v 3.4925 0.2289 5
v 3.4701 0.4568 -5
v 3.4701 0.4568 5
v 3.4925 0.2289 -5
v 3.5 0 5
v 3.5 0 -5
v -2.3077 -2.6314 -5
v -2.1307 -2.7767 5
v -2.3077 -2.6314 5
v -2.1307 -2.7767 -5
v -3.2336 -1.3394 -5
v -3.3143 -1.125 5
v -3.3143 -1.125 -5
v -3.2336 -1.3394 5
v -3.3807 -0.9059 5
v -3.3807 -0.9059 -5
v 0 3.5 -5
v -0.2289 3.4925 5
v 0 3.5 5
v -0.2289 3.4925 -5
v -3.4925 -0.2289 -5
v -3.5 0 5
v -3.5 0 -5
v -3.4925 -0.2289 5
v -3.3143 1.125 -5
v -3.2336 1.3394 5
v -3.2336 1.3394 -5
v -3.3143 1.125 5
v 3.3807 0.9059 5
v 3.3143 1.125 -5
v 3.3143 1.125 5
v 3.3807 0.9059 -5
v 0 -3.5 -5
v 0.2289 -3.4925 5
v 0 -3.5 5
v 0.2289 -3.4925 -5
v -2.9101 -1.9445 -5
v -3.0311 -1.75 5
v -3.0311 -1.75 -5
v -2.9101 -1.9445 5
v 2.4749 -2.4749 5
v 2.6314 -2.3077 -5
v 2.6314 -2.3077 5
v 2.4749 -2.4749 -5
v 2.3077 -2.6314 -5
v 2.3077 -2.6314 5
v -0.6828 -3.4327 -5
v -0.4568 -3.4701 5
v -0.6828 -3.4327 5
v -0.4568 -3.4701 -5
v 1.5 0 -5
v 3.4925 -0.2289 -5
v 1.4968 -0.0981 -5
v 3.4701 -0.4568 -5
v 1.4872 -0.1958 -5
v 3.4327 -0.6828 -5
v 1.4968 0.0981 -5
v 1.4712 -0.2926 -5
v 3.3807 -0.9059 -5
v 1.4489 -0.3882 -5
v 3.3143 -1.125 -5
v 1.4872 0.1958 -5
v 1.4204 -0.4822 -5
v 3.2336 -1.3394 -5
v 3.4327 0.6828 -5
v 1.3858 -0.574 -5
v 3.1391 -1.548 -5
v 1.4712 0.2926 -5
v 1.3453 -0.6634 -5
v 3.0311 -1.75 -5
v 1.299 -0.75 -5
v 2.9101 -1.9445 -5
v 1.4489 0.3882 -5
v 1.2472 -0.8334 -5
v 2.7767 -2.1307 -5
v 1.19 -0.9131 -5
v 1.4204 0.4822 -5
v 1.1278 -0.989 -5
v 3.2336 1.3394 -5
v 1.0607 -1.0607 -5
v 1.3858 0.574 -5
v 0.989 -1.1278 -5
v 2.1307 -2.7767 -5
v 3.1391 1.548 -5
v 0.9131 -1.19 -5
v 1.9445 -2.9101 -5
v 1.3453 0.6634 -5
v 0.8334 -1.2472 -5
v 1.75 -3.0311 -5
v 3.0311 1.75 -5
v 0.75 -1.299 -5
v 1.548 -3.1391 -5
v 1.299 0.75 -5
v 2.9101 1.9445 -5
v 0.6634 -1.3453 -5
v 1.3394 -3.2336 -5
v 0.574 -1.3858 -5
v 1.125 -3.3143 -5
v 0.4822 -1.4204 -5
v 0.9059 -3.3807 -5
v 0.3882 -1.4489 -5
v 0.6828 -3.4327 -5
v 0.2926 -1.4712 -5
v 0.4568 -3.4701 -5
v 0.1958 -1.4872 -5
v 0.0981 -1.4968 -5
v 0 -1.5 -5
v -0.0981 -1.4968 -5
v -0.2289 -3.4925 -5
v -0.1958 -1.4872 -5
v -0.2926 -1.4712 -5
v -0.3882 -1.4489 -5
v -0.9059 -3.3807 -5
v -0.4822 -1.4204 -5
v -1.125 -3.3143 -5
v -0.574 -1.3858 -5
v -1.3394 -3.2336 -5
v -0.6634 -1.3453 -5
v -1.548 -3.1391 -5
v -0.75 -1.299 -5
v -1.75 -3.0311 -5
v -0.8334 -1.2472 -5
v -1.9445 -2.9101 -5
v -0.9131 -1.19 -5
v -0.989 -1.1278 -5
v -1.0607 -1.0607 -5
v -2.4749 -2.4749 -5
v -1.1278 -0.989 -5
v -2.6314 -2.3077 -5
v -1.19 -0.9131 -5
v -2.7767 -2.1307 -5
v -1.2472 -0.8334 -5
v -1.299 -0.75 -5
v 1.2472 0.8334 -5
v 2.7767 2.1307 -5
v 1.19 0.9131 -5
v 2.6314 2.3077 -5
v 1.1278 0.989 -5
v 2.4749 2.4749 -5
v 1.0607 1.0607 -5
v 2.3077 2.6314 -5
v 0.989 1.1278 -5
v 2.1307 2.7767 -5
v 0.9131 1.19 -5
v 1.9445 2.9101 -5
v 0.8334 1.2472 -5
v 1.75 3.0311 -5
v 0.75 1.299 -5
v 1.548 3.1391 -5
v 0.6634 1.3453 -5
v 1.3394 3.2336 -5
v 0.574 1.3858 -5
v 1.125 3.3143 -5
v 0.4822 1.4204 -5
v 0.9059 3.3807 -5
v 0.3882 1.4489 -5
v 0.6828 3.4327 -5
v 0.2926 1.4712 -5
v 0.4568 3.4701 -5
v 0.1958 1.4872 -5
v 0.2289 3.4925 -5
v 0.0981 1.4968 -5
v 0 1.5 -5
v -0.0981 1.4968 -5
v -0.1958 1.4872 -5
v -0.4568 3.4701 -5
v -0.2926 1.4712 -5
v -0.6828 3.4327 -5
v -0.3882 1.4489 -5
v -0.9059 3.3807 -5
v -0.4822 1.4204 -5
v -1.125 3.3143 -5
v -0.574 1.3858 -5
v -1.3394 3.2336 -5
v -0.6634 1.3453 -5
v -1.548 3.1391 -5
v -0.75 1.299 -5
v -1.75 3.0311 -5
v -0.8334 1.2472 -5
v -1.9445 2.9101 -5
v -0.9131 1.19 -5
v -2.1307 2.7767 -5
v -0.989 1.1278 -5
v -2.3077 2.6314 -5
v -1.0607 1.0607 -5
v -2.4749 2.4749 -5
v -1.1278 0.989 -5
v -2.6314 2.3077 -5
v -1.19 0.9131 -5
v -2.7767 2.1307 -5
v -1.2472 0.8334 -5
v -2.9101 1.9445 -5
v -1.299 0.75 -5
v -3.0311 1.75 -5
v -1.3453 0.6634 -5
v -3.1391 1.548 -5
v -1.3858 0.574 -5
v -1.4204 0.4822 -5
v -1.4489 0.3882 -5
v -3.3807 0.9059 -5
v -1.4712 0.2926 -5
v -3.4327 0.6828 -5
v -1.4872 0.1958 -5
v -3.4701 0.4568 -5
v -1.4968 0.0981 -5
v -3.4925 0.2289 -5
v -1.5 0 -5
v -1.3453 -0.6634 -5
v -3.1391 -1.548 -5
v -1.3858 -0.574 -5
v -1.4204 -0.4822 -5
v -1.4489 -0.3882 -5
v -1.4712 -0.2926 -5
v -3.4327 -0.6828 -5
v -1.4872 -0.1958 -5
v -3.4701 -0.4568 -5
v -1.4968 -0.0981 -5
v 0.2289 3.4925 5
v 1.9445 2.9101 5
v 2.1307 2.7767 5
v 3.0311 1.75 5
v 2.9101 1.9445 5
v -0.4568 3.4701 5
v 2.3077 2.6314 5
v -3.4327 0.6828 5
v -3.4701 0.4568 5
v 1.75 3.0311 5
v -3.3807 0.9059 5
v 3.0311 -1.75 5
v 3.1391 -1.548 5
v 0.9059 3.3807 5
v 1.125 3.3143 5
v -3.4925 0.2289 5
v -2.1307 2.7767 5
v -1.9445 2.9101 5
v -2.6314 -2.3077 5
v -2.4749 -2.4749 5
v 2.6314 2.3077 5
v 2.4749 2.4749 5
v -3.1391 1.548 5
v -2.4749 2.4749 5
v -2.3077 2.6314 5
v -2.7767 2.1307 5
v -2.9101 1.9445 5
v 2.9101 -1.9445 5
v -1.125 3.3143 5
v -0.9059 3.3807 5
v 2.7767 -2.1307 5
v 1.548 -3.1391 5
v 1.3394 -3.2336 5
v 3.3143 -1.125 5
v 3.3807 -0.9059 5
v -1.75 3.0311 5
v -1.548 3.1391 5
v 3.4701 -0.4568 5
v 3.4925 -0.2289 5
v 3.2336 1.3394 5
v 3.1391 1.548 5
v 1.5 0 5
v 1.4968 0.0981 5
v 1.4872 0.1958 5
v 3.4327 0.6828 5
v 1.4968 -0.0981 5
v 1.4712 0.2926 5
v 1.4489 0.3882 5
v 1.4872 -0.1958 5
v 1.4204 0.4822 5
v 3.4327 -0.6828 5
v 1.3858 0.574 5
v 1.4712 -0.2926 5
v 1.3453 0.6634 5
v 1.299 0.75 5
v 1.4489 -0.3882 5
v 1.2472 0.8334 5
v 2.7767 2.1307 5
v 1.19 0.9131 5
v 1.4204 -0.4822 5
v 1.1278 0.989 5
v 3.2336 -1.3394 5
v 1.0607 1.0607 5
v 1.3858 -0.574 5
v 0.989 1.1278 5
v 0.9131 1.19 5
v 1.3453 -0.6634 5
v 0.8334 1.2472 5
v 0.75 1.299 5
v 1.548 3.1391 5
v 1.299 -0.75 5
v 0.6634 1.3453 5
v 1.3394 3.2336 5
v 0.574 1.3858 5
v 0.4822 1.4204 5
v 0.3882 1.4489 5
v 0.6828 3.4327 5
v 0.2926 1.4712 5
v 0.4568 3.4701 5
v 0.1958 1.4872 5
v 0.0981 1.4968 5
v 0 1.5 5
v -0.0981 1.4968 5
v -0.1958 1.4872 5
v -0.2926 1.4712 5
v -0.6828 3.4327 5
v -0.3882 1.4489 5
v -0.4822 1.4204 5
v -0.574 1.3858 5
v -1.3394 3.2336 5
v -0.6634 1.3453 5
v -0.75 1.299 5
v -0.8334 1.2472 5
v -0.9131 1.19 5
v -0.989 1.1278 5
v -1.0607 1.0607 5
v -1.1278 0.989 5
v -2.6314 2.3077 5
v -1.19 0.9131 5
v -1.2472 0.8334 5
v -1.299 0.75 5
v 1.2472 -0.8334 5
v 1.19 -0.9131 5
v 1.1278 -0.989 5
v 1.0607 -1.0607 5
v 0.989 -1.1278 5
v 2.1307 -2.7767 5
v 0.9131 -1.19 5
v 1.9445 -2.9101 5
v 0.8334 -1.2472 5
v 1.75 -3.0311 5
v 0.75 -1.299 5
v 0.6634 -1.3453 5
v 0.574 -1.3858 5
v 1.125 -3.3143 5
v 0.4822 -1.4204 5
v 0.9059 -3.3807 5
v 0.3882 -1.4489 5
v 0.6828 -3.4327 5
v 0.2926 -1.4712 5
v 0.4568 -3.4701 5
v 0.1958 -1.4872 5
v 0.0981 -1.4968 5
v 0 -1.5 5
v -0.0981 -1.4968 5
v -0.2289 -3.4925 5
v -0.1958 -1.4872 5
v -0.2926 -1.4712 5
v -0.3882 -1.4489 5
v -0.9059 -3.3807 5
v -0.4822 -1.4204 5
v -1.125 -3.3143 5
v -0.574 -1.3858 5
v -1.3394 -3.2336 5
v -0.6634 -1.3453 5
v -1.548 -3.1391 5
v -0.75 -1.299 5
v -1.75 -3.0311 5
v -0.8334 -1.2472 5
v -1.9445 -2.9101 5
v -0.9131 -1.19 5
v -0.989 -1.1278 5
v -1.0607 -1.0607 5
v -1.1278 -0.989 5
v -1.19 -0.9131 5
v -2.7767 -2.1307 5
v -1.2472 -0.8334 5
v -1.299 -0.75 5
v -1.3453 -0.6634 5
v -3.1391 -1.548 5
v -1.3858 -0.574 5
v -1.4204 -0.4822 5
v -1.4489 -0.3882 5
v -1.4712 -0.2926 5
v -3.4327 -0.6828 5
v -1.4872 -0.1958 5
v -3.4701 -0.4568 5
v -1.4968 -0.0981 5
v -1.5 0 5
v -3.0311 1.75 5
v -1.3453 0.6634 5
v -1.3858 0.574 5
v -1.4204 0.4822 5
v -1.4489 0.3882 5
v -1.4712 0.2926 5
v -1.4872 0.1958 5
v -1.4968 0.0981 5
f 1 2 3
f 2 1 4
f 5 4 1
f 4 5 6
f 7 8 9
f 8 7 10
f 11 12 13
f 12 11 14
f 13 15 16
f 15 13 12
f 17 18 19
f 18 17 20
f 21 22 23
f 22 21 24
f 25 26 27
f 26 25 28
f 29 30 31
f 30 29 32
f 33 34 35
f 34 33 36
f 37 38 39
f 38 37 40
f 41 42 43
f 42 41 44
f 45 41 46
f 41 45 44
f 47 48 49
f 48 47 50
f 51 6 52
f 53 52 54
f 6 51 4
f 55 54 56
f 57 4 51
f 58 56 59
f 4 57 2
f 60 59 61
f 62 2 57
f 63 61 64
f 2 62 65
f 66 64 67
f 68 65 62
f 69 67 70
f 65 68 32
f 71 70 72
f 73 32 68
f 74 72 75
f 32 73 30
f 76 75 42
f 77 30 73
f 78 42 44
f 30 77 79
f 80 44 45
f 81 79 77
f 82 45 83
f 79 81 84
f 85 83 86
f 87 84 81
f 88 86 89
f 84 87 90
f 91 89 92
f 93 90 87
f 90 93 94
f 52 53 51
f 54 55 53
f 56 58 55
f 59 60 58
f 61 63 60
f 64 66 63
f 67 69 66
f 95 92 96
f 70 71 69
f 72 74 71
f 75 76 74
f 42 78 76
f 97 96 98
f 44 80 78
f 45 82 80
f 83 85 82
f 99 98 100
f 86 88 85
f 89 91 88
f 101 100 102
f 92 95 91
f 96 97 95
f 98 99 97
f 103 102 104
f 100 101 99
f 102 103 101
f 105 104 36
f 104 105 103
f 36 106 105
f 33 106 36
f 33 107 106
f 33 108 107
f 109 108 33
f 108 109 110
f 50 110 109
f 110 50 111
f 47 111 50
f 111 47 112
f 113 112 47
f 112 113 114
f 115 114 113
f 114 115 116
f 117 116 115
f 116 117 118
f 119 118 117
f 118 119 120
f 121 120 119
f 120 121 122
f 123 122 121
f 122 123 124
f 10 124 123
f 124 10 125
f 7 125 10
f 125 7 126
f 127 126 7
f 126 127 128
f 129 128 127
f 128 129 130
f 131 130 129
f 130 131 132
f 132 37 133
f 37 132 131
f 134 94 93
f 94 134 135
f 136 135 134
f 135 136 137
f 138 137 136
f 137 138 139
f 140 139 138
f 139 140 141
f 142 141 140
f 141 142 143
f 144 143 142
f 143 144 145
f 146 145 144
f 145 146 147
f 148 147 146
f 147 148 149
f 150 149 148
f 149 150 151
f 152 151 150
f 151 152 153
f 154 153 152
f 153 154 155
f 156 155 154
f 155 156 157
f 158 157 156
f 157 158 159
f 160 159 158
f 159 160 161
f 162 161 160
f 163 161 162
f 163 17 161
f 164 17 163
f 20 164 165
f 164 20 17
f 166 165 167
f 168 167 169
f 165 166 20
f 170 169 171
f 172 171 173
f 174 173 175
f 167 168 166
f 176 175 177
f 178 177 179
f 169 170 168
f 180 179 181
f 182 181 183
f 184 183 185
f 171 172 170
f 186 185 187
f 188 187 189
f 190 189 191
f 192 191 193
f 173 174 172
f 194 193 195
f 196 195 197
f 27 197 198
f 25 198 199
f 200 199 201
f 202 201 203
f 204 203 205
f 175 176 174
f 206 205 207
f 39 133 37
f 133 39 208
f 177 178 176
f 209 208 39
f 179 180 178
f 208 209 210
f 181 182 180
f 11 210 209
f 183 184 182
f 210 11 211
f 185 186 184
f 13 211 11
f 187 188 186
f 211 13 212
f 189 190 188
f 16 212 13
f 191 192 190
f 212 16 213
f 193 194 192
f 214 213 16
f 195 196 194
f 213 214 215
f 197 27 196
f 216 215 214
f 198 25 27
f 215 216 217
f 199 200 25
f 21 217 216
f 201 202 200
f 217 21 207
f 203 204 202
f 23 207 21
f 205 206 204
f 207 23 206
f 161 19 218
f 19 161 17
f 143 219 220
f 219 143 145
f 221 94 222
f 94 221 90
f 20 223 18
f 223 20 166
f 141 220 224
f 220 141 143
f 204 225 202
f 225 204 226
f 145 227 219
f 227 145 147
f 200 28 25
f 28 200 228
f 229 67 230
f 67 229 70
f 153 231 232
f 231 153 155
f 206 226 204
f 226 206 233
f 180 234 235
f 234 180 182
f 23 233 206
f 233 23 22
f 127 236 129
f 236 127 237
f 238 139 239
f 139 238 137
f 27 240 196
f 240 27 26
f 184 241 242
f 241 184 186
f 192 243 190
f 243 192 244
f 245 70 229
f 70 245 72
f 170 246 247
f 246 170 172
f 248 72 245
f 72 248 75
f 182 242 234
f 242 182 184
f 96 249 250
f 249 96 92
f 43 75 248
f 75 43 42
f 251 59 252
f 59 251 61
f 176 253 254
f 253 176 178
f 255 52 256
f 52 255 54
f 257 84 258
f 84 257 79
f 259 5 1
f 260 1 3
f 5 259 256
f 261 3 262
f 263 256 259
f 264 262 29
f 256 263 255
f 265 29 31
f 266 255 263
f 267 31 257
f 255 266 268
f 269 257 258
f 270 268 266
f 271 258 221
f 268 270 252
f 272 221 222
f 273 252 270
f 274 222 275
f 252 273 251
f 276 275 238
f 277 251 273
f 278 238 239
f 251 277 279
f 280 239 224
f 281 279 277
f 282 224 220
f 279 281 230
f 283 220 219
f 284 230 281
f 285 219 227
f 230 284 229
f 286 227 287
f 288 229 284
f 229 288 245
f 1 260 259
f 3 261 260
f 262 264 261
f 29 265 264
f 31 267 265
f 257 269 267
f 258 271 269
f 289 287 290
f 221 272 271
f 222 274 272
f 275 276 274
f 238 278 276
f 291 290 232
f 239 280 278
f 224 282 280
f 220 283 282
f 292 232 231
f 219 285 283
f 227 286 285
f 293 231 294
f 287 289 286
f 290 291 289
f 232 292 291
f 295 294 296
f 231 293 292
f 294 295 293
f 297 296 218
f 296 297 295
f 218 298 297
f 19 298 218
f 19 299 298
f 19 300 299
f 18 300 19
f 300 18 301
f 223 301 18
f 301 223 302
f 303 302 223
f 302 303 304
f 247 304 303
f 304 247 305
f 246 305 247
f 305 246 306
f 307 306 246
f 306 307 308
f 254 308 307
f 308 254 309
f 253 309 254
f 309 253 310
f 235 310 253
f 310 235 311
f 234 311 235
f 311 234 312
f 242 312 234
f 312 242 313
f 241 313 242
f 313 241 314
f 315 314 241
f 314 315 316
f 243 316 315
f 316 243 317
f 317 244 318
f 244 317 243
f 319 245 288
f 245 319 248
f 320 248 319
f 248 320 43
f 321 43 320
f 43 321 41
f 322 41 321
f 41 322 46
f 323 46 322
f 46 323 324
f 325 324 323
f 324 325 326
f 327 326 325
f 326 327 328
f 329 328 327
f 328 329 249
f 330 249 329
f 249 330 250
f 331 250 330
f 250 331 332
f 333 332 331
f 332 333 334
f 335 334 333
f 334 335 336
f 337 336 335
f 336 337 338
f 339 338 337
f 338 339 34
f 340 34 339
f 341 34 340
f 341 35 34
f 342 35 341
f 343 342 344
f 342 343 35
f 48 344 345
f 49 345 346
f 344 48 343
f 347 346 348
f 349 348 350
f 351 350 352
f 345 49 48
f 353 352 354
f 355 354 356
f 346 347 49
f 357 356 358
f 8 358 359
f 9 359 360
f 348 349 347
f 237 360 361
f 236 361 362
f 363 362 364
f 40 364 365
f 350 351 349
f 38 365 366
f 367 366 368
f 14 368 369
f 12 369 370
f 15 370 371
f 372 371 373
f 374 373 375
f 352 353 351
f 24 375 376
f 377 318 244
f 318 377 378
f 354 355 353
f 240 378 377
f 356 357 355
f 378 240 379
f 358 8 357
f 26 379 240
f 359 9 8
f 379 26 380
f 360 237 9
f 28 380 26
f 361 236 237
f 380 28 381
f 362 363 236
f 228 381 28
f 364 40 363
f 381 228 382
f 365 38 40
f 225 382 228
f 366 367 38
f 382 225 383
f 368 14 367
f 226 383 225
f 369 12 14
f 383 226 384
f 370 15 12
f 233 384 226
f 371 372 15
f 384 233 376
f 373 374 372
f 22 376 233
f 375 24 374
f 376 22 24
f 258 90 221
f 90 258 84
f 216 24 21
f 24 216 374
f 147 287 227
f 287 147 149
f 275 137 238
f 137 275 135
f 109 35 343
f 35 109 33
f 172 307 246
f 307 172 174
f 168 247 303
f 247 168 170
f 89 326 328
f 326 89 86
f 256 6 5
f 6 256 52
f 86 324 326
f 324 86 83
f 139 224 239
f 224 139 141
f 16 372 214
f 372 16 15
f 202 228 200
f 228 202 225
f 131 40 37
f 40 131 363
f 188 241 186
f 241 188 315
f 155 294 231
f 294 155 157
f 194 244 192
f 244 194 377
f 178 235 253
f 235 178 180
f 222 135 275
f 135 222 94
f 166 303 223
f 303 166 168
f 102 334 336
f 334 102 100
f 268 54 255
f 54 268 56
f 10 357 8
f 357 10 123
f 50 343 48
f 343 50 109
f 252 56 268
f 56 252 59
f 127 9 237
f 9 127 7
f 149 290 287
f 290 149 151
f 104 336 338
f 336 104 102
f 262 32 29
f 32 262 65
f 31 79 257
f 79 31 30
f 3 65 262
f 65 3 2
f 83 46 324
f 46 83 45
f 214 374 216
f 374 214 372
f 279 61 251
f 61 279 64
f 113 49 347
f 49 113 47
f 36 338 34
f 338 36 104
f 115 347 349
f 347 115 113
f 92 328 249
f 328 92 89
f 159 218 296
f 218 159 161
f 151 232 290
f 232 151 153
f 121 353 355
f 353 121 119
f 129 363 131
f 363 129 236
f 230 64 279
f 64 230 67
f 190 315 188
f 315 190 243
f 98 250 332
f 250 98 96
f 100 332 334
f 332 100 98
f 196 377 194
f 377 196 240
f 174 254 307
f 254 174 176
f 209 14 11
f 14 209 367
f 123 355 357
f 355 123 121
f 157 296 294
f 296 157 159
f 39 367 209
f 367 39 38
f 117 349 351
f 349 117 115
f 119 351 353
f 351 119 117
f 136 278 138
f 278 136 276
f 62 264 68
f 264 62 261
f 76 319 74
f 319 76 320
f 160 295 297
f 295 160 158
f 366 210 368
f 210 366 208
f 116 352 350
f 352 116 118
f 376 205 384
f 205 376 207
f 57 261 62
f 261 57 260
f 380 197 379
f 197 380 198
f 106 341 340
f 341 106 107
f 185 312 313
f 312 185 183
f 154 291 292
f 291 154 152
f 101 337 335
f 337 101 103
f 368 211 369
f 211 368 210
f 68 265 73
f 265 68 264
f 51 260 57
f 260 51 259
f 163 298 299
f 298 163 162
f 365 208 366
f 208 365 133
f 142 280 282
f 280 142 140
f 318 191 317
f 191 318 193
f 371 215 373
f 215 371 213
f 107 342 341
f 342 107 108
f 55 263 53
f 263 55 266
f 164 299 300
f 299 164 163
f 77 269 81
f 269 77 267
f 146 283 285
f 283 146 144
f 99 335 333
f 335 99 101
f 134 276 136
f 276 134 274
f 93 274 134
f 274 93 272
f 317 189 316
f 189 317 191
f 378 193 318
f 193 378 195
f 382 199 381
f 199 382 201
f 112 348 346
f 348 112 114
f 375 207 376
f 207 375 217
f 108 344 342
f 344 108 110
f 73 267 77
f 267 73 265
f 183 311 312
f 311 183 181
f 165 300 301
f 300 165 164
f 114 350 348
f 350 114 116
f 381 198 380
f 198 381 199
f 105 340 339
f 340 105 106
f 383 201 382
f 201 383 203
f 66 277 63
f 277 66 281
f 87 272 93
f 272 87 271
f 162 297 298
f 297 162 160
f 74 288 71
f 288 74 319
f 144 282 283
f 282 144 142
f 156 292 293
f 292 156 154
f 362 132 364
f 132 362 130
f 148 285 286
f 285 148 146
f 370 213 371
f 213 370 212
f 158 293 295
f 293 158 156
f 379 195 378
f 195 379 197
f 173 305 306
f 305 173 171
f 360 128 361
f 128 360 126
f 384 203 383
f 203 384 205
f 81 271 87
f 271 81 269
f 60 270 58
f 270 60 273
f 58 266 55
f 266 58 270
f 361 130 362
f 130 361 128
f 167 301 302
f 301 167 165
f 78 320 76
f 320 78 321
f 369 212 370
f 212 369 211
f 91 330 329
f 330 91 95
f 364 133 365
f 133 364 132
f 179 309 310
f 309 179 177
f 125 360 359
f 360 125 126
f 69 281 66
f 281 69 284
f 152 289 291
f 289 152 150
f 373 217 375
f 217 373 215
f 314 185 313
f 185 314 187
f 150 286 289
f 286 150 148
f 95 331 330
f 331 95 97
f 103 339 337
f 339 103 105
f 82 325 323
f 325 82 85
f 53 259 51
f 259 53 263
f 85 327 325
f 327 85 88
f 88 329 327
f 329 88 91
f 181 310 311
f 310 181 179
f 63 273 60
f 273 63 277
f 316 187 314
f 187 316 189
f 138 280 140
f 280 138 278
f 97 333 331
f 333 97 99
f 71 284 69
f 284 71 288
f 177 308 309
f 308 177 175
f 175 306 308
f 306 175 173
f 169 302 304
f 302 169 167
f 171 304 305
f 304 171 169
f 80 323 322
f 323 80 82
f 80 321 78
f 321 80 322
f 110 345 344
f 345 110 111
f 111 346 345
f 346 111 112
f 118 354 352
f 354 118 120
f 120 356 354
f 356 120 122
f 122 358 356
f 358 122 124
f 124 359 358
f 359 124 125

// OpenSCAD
// Linear bearing: 3.0mm bore, 7.0mm OD, 10.0mm length
bore_diameter_mm  = 3.0;   //[1.5:6:0.1]
outer_diameter_mm = 7.0;   //[3.5:14:0.1]
length_mm         = 10.0;  //[5:20:0.1]
fit_clearance_mm  = 0.0;   //[0:0.4:0.05]

// Smoothness (ensure circular bore/OD)
$fn = 96;

module linear_bearing() {
    difference() {
        // Outer sleeve
        cylinder(h=length_mm, r=outer_diameter_mm/2, center=true);

        // Through bore (slightly extended to guarantee clean cut)
        cylinder(h=length_mm + 0.2, r=(bore_diameter_mm + fit_clearance_mm)/2, center=true);
    }
}

linear_bearing();
